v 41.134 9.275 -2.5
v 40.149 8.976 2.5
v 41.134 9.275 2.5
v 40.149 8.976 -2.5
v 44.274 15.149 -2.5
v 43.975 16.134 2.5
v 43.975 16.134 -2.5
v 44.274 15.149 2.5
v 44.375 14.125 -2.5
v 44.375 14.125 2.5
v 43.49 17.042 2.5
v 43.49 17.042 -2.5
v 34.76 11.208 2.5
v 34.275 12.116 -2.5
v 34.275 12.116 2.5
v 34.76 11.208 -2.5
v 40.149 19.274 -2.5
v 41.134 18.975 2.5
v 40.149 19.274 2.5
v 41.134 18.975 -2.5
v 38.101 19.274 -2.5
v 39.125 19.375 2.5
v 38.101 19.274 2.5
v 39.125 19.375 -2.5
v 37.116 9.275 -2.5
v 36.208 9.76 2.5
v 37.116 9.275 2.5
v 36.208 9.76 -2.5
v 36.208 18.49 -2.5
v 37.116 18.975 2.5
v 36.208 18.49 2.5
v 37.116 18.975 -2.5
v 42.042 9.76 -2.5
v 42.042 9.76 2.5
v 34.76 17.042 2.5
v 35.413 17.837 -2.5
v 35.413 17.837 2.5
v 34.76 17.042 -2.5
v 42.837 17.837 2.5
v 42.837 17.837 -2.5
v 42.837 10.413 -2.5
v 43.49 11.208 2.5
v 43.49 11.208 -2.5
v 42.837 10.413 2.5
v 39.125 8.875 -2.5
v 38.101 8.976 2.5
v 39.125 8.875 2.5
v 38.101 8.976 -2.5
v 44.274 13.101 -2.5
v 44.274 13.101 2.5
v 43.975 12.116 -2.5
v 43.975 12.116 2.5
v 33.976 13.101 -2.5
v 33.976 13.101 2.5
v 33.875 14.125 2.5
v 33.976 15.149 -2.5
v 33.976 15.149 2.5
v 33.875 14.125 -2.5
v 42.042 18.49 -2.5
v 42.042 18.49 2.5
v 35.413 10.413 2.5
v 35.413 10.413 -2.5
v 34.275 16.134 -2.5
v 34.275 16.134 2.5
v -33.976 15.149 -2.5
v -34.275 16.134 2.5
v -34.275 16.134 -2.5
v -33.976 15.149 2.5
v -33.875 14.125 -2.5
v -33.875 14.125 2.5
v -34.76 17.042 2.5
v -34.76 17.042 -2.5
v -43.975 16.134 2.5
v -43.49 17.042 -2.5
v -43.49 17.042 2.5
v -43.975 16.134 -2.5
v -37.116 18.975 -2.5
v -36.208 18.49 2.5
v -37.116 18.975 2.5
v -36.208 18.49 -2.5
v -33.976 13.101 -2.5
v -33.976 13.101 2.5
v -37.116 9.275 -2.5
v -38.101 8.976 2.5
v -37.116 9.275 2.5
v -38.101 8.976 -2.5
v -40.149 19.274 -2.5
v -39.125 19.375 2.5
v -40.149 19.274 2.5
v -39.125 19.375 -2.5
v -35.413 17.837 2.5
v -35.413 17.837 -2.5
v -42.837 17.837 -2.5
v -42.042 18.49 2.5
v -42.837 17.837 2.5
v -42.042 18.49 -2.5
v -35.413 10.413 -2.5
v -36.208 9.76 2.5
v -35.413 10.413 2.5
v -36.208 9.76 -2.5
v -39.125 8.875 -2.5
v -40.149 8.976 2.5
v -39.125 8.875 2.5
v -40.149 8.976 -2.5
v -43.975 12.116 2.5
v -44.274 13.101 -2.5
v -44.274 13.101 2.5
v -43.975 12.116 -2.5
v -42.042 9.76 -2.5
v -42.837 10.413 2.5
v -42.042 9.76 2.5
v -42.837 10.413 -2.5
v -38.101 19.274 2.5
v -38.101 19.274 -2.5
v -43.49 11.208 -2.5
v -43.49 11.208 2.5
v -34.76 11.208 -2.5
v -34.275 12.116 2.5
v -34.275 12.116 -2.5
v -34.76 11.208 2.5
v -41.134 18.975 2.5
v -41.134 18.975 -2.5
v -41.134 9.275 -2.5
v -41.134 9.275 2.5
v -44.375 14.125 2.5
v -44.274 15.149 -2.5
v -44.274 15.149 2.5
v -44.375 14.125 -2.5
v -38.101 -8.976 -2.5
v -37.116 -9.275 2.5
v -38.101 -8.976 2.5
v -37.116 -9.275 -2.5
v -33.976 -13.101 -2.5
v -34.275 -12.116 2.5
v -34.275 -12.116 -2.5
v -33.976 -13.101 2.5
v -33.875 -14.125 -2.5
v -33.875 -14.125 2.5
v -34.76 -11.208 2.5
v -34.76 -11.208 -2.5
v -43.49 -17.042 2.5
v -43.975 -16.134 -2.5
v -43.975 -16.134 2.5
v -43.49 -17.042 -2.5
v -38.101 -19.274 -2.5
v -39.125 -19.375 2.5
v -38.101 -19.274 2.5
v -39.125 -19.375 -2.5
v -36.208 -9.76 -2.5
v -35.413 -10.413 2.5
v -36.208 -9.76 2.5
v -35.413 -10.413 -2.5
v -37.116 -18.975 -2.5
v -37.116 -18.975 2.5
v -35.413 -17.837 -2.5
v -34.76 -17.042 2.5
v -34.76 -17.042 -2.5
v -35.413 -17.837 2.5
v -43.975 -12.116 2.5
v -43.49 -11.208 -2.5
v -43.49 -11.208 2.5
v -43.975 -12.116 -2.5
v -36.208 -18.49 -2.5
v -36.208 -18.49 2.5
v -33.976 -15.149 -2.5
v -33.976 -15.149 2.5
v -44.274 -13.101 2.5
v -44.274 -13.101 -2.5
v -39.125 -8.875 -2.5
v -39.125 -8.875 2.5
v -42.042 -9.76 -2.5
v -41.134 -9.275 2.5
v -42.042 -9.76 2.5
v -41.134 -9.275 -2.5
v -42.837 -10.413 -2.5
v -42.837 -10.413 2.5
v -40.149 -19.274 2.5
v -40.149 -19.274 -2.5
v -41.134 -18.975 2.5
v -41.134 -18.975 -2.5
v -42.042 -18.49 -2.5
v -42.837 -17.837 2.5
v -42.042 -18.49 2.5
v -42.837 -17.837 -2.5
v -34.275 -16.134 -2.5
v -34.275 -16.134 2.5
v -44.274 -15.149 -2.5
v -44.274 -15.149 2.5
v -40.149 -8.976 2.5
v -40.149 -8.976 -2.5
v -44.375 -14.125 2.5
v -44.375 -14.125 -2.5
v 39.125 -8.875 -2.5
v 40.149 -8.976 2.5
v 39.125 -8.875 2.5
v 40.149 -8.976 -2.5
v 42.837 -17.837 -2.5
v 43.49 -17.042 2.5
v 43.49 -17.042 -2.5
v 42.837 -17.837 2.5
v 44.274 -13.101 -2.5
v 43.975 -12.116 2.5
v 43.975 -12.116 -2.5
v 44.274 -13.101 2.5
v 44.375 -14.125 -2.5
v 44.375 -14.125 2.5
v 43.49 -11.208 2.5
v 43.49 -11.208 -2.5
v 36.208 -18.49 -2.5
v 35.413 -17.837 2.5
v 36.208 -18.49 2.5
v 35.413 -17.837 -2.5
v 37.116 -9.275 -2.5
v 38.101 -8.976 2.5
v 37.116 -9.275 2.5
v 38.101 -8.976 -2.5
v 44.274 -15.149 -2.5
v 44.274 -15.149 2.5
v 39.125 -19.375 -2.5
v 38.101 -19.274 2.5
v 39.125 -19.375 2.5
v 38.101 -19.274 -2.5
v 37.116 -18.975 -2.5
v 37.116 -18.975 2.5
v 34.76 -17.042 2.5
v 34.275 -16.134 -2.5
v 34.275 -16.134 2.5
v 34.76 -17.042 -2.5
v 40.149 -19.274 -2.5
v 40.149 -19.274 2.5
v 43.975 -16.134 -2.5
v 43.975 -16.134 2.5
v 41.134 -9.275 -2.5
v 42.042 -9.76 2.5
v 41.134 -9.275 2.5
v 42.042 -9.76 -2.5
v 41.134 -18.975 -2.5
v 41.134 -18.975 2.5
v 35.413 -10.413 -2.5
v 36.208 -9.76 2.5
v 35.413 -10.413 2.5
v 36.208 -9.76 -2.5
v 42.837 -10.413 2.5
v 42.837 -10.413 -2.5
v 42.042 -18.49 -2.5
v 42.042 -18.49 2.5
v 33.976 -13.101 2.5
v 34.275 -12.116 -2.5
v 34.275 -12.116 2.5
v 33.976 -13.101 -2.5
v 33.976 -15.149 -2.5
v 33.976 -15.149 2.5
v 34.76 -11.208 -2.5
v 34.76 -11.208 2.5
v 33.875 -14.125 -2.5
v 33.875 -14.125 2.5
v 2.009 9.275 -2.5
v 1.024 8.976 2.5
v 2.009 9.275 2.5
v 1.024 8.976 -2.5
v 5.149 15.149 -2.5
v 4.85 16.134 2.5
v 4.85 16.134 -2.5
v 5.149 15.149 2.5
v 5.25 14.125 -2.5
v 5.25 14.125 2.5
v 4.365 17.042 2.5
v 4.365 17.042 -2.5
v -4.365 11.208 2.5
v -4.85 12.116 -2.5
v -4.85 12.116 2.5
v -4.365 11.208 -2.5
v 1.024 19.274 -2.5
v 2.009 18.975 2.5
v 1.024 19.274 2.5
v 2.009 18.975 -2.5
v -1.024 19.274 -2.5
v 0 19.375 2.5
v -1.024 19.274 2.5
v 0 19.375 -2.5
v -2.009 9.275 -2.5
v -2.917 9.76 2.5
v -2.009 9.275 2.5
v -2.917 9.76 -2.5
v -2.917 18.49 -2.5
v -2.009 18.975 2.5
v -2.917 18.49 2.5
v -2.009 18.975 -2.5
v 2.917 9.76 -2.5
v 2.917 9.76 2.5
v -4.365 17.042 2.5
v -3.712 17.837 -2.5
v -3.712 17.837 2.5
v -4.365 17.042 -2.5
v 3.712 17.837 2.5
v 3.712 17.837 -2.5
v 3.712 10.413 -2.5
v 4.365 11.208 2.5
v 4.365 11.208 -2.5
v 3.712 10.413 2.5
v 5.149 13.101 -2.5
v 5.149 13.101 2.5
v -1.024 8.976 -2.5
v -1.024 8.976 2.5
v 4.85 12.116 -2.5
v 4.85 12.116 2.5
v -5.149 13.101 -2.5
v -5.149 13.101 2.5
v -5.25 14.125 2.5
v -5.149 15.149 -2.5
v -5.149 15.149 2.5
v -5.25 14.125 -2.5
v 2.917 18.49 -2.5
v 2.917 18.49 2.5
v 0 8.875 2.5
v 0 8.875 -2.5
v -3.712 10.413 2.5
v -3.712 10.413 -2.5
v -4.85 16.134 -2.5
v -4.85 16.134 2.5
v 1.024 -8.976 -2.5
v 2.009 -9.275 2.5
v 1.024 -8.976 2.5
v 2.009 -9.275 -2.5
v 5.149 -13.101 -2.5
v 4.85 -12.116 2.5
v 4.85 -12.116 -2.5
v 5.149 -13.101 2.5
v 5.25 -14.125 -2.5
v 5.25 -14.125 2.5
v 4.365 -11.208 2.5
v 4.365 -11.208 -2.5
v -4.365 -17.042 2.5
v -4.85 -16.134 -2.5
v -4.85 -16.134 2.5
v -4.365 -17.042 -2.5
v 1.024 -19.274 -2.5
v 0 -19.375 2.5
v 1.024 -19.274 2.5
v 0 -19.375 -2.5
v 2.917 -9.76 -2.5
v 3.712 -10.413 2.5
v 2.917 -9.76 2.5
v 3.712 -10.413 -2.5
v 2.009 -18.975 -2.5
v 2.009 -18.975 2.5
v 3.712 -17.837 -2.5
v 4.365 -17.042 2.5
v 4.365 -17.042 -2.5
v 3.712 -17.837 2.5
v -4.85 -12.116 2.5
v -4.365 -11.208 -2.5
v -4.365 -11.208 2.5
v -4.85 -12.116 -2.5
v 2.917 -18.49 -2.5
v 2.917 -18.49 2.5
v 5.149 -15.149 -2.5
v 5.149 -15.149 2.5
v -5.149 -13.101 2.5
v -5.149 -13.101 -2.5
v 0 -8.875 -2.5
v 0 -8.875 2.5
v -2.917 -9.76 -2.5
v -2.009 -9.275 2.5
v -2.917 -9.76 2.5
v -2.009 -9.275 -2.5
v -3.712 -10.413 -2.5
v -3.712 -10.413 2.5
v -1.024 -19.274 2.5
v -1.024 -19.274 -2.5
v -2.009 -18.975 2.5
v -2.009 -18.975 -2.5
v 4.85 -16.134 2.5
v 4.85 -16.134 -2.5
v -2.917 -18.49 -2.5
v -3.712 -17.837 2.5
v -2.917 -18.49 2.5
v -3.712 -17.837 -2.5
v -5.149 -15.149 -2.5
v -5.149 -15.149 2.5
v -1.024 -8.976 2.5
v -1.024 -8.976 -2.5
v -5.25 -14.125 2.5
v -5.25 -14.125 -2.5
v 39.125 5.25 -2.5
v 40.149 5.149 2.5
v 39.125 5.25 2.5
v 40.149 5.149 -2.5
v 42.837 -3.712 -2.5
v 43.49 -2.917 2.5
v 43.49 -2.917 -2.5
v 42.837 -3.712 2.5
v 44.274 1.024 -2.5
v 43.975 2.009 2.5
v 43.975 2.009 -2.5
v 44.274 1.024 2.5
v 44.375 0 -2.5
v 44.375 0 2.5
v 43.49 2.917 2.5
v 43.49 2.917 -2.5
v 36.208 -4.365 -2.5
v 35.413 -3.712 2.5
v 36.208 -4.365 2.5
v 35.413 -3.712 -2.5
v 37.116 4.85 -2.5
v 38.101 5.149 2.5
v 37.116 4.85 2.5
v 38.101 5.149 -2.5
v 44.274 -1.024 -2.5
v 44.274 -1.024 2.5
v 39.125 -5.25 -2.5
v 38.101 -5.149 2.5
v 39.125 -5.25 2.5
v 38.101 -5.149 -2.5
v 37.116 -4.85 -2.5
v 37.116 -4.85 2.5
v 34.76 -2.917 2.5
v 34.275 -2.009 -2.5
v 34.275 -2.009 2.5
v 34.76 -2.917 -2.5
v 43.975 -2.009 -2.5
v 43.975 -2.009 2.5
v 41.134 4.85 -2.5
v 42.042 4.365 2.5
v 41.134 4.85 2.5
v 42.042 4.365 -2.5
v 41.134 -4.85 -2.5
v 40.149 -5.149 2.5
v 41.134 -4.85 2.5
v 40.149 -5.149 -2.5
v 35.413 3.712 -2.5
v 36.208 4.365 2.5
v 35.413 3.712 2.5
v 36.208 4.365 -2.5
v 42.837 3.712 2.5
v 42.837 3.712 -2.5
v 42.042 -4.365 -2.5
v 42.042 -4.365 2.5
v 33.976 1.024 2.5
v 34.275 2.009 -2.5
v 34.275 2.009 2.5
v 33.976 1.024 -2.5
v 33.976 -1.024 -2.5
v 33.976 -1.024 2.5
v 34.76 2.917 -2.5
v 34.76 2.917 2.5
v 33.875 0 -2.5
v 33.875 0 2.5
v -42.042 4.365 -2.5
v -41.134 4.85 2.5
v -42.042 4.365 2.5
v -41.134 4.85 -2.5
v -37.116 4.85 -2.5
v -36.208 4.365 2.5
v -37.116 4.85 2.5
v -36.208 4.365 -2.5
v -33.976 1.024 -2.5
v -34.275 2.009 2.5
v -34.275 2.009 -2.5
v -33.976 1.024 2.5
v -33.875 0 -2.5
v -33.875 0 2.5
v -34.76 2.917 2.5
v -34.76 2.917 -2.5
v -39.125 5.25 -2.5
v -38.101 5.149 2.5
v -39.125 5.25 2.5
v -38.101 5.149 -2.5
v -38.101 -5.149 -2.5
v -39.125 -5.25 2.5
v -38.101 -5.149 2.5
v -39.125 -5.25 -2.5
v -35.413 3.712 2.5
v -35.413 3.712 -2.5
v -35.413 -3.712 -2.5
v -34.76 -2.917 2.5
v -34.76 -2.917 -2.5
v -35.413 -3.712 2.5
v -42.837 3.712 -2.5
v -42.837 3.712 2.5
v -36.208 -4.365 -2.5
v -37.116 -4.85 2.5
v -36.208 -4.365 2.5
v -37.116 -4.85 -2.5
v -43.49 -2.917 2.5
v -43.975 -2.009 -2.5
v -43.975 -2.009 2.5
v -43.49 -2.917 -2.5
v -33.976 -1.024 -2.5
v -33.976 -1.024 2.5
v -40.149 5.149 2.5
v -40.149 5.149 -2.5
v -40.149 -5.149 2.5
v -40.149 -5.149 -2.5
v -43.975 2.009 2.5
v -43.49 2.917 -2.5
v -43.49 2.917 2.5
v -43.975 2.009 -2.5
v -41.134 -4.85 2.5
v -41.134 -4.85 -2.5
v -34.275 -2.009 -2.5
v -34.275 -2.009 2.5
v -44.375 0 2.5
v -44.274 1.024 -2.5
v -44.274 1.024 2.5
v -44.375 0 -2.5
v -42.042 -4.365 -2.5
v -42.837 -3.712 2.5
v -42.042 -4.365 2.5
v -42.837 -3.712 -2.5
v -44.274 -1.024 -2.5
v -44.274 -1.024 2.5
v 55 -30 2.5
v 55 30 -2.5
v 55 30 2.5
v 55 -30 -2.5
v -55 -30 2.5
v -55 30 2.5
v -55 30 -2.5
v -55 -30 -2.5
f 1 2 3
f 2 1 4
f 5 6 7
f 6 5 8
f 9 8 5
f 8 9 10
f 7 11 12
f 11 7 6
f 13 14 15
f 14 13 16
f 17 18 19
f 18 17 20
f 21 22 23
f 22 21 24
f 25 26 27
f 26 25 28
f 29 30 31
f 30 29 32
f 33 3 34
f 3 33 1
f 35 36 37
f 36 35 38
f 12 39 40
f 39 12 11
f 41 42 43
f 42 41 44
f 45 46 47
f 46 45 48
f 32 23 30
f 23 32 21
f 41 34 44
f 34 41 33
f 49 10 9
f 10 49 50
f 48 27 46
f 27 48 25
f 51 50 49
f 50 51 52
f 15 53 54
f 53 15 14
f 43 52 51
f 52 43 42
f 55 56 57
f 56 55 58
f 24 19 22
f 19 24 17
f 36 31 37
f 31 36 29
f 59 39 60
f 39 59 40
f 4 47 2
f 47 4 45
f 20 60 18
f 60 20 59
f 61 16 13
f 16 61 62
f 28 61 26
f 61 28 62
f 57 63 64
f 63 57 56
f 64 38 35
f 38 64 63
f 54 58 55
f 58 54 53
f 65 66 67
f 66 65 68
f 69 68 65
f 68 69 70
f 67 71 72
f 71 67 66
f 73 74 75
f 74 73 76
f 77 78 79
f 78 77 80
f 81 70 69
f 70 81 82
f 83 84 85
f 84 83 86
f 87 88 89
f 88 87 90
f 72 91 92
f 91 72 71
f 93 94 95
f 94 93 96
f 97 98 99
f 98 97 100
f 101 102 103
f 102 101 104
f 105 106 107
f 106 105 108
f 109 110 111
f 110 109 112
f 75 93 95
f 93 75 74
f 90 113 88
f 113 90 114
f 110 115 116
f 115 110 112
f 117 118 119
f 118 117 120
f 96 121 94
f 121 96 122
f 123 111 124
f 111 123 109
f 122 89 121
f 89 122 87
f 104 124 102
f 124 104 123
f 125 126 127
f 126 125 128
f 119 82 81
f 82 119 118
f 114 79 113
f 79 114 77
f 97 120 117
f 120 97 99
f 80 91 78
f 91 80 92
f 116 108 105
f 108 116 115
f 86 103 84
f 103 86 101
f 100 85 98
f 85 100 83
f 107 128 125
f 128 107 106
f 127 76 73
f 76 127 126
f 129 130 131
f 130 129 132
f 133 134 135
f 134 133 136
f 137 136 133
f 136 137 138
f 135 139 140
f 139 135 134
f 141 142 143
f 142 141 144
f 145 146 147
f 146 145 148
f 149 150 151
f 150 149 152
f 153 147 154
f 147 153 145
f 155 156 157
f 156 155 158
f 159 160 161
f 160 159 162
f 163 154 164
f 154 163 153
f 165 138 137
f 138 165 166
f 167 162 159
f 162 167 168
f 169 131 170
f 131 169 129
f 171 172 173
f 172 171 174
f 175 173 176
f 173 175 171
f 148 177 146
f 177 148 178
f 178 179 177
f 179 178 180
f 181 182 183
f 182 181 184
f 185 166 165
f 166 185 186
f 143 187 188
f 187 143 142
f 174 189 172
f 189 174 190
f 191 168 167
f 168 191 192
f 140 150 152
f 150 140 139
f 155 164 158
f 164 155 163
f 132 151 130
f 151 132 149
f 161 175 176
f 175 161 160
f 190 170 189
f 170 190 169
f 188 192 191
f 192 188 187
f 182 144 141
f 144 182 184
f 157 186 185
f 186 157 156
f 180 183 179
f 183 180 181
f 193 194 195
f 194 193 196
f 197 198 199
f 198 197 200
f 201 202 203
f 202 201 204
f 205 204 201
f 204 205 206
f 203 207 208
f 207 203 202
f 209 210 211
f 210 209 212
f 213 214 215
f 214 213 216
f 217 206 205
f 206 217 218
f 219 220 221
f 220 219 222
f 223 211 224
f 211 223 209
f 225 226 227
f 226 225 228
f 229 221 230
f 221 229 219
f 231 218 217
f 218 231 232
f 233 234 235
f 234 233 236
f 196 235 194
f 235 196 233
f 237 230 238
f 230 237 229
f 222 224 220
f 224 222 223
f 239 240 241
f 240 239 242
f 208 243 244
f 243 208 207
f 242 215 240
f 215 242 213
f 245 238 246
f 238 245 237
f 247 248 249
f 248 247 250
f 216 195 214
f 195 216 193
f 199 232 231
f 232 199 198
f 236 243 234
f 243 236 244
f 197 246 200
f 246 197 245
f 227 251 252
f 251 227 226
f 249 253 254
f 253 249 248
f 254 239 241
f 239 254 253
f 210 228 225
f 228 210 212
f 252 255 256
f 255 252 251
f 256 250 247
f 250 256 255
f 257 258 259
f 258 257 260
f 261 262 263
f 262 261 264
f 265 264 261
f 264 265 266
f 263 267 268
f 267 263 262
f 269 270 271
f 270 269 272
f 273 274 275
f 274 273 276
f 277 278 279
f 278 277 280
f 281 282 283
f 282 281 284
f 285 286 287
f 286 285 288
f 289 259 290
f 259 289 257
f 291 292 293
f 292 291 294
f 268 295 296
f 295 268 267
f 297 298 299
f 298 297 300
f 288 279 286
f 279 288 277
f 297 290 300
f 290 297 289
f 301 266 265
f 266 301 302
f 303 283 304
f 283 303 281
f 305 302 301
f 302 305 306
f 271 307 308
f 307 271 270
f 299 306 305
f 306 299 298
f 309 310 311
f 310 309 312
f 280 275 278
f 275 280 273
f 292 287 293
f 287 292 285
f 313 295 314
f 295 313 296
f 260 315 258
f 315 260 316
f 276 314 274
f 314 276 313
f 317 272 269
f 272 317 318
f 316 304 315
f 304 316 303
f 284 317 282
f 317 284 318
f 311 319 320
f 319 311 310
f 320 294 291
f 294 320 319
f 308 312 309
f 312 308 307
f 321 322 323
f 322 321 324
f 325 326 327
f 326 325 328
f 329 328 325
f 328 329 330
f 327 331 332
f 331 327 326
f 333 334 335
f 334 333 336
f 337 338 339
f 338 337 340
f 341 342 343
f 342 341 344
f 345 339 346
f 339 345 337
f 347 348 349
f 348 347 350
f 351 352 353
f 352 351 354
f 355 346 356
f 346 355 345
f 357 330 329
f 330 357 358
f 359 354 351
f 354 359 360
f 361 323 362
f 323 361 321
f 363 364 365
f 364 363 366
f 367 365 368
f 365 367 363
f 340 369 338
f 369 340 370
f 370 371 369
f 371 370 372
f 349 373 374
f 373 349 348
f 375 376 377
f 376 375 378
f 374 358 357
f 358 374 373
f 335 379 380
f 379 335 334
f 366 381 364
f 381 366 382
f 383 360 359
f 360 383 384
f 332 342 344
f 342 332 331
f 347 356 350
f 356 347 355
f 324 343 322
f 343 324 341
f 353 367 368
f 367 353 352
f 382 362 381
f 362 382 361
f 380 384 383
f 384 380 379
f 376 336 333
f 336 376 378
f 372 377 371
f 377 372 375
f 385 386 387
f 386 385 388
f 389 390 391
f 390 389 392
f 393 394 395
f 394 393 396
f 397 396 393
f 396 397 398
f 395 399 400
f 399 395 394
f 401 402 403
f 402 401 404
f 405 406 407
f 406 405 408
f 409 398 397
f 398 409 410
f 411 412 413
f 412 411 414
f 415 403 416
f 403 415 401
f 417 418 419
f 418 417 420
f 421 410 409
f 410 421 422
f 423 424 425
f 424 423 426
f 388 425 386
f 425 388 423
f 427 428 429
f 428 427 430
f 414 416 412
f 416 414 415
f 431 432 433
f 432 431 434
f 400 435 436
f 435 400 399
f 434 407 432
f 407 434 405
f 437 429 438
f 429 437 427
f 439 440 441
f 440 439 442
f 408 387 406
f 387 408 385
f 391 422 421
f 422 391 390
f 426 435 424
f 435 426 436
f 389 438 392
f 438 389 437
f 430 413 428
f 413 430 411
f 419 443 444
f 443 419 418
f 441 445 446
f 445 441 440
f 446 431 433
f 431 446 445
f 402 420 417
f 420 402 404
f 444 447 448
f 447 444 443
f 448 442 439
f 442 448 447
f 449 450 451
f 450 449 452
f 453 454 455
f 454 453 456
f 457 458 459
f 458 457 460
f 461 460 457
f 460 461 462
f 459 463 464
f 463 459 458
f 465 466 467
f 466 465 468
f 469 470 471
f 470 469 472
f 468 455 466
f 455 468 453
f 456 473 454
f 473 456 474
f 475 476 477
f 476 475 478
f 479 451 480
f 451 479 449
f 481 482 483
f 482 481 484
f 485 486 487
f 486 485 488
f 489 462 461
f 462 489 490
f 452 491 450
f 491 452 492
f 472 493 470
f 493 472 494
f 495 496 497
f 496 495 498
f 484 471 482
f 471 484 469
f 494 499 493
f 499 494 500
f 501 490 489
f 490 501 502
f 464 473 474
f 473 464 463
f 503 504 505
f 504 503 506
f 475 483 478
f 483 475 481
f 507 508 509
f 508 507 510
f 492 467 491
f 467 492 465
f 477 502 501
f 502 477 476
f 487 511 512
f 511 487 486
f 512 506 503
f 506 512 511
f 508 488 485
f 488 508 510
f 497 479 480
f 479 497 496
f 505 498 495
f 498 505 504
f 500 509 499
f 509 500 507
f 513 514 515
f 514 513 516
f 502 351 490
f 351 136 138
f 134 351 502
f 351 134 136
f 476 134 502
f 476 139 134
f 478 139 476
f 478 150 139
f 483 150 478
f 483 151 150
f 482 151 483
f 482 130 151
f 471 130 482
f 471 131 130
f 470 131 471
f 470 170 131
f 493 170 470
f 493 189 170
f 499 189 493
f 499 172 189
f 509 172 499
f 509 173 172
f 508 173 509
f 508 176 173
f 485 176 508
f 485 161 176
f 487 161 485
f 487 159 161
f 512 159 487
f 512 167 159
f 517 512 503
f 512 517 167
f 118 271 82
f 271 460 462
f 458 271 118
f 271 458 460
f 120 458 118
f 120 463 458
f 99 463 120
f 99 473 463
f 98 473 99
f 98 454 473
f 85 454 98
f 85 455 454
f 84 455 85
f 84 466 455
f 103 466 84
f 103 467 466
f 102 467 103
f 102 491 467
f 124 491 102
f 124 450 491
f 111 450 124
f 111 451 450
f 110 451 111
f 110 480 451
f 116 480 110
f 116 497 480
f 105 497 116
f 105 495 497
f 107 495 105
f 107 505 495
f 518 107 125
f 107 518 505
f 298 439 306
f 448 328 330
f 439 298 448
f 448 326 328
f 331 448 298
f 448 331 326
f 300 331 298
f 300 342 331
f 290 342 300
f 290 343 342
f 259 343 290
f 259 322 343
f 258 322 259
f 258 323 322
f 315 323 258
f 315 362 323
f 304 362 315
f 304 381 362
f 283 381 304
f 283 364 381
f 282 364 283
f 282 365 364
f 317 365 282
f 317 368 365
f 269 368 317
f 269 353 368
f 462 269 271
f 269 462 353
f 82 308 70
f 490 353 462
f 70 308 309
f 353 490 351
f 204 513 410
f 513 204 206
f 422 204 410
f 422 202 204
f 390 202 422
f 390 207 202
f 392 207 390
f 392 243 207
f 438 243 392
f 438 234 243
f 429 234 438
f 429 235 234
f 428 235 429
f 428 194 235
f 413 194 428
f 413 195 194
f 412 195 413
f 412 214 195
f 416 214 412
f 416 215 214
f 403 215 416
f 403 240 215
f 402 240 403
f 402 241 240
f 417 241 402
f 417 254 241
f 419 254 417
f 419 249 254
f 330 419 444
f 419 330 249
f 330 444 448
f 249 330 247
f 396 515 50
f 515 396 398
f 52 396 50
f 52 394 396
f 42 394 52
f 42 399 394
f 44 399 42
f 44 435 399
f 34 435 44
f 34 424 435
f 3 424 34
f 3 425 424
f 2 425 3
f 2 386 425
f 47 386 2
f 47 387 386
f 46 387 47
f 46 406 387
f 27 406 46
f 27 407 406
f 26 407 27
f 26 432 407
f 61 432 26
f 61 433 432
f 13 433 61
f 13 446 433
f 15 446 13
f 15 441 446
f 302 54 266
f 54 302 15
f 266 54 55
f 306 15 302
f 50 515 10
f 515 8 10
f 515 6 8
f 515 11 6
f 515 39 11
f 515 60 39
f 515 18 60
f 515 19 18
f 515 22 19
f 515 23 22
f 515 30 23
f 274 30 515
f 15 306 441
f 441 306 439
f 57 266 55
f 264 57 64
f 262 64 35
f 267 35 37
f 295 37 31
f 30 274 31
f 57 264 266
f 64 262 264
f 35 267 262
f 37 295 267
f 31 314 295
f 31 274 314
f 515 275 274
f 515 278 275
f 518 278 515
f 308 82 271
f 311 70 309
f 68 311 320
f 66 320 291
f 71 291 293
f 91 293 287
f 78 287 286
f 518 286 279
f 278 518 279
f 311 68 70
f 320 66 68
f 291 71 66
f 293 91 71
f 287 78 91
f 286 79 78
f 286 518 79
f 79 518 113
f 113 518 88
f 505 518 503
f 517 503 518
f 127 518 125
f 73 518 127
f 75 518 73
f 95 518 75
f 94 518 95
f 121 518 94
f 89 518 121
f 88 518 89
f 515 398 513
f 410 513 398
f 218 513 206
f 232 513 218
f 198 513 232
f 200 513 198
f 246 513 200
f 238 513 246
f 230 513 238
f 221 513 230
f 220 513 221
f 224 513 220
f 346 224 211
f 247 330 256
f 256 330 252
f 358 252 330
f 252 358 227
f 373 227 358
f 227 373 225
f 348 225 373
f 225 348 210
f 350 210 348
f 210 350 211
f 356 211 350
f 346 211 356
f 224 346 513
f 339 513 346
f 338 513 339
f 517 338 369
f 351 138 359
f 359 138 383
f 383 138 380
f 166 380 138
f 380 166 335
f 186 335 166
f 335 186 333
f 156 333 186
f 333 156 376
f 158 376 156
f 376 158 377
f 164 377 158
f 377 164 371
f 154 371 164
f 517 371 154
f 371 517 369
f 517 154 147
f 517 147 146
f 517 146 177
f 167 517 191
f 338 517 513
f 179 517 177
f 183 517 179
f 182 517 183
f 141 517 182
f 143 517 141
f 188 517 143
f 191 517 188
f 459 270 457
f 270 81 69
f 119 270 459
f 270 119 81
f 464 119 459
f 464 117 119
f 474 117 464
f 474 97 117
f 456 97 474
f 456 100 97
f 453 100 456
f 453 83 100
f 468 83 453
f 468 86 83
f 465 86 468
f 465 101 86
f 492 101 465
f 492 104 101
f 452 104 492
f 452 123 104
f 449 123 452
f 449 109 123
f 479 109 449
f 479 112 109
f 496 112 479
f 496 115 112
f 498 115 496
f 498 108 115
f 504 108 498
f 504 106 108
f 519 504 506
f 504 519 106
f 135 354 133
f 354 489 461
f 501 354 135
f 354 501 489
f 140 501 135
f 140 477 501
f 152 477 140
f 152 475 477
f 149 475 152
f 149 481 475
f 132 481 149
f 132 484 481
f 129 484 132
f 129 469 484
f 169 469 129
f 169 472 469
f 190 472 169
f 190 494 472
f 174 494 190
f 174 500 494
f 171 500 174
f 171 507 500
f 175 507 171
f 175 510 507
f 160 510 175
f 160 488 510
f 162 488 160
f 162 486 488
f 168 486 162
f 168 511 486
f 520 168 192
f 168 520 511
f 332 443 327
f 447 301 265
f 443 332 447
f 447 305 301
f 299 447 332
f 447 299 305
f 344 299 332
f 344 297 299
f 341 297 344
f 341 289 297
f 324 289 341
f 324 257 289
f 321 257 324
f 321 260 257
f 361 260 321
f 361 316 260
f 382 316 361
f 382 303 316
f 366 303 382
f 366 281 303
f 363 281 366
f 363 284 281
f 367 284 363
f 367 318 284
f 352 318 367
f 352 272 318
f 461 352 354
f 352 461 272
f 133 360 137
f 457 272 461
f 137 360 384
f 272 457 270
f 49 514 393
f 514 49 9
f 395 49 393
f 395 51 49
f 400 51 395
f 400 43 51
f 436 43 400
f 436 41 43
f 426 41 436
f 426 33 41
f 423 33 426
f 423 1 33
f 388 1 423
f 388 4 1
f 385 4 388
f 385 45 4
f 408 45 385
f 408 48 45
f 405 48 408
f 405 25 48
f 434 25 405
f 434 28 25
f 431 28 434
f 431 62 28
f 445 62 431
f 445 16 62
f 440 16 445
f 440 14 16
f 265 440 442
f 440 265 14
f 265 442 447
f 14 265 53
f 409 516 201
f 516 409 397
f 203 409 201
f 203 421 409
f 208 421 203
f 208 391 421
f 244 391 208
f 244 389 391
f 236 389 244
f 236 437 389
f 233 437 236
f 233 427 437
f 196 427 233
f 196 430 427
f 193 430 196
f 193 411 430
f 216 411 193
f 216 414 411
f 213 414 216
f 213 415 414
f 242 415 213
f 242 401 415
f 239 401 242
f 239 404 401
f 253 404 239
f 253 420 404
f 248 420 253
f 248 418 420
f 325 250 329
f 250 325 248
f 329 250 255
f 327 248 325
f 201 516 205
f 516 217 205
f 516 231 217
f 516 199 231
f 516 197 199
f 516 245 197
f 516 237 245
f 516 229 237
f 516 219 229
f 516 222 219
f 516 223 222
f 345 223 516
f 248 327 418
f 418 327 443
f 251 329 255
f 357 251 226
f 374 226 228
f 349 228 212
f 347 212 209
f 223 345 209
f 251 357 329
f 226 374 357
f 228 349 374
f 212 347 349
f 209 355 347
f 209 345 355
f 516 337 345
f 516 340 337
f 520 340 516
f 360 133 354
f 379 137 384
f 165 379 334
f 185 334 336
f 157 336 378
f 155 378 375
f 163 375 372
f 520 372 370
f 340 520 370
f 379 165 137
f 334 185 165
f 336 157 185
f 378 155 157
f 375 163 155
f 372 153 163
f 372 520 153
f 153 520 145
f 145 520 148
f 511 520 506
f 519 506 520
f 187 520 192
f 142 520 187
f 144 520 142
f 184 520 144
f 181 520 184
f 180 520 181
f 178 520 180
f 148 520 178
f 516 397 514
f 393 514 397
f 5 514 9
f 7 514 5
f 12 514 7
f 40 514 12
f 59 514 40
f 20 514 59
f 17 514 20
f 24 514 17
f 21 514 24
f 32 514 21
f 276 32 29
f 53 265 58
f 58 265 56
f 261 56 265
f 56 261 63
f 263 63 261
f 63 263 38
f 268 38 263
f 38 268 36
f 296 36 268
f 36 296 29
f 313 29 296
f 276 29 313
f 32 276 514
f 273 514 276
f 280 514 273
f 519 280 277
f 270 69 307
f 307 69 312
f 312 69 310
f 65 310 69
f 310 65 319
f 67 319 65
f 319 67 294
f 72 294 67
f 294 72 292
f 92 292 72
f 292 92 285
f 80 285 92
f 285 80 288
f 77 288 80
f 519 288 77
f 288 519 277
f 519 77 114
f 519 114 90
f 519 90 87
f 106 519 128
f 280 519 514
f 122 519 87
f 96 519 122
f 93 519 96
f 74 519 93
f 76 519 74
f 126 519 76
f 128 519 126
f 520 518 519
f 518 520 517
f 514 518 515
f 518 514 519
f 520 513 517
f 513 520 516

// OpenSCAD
$fn = 32;

// ----------------------------------------------------------------------
// Corner plate 110 x 60 x 5
// 8 holes, centres taken from the edge offset
// ----------------------------------------------------------------------

// --- parameters (mm) ---
plate = [110, 60, 5];  // overall size (x, y, z)
holes = 8;             // number of holes the drawing asks for
hole_d = 10.5;         // hole diameter
edge = 15.875;         // hole centre offset from the plate edge

// --- derived feature positions (mm) ---
corner_x = plate[0] / 2 - edge;  // = 39.12   corner hole X
corner_y = plate[1] / 2 - edge;  // = 14.12   corner hole Y
feature_centers = [
  [corner_x, corner_y],
  [-corner_x, corner_y],
  [-corner_x, -corner_y],
  [corner_x, -corner_y],
  [0, corner_y],
  [0, -corner_y],
  [corner_x, 0],
  [-corner_x, 0]
];   // hole centres the loop below drills

// plate outline, every hole drilled through with the same cutters
difference() {
  cube(plate, center = true);
  for (centre = feature_centers)
    translate([centre[0], centre[1], 0])
      cylinder(d = hole_d, h = plate[2] + 2, center = true);
}
